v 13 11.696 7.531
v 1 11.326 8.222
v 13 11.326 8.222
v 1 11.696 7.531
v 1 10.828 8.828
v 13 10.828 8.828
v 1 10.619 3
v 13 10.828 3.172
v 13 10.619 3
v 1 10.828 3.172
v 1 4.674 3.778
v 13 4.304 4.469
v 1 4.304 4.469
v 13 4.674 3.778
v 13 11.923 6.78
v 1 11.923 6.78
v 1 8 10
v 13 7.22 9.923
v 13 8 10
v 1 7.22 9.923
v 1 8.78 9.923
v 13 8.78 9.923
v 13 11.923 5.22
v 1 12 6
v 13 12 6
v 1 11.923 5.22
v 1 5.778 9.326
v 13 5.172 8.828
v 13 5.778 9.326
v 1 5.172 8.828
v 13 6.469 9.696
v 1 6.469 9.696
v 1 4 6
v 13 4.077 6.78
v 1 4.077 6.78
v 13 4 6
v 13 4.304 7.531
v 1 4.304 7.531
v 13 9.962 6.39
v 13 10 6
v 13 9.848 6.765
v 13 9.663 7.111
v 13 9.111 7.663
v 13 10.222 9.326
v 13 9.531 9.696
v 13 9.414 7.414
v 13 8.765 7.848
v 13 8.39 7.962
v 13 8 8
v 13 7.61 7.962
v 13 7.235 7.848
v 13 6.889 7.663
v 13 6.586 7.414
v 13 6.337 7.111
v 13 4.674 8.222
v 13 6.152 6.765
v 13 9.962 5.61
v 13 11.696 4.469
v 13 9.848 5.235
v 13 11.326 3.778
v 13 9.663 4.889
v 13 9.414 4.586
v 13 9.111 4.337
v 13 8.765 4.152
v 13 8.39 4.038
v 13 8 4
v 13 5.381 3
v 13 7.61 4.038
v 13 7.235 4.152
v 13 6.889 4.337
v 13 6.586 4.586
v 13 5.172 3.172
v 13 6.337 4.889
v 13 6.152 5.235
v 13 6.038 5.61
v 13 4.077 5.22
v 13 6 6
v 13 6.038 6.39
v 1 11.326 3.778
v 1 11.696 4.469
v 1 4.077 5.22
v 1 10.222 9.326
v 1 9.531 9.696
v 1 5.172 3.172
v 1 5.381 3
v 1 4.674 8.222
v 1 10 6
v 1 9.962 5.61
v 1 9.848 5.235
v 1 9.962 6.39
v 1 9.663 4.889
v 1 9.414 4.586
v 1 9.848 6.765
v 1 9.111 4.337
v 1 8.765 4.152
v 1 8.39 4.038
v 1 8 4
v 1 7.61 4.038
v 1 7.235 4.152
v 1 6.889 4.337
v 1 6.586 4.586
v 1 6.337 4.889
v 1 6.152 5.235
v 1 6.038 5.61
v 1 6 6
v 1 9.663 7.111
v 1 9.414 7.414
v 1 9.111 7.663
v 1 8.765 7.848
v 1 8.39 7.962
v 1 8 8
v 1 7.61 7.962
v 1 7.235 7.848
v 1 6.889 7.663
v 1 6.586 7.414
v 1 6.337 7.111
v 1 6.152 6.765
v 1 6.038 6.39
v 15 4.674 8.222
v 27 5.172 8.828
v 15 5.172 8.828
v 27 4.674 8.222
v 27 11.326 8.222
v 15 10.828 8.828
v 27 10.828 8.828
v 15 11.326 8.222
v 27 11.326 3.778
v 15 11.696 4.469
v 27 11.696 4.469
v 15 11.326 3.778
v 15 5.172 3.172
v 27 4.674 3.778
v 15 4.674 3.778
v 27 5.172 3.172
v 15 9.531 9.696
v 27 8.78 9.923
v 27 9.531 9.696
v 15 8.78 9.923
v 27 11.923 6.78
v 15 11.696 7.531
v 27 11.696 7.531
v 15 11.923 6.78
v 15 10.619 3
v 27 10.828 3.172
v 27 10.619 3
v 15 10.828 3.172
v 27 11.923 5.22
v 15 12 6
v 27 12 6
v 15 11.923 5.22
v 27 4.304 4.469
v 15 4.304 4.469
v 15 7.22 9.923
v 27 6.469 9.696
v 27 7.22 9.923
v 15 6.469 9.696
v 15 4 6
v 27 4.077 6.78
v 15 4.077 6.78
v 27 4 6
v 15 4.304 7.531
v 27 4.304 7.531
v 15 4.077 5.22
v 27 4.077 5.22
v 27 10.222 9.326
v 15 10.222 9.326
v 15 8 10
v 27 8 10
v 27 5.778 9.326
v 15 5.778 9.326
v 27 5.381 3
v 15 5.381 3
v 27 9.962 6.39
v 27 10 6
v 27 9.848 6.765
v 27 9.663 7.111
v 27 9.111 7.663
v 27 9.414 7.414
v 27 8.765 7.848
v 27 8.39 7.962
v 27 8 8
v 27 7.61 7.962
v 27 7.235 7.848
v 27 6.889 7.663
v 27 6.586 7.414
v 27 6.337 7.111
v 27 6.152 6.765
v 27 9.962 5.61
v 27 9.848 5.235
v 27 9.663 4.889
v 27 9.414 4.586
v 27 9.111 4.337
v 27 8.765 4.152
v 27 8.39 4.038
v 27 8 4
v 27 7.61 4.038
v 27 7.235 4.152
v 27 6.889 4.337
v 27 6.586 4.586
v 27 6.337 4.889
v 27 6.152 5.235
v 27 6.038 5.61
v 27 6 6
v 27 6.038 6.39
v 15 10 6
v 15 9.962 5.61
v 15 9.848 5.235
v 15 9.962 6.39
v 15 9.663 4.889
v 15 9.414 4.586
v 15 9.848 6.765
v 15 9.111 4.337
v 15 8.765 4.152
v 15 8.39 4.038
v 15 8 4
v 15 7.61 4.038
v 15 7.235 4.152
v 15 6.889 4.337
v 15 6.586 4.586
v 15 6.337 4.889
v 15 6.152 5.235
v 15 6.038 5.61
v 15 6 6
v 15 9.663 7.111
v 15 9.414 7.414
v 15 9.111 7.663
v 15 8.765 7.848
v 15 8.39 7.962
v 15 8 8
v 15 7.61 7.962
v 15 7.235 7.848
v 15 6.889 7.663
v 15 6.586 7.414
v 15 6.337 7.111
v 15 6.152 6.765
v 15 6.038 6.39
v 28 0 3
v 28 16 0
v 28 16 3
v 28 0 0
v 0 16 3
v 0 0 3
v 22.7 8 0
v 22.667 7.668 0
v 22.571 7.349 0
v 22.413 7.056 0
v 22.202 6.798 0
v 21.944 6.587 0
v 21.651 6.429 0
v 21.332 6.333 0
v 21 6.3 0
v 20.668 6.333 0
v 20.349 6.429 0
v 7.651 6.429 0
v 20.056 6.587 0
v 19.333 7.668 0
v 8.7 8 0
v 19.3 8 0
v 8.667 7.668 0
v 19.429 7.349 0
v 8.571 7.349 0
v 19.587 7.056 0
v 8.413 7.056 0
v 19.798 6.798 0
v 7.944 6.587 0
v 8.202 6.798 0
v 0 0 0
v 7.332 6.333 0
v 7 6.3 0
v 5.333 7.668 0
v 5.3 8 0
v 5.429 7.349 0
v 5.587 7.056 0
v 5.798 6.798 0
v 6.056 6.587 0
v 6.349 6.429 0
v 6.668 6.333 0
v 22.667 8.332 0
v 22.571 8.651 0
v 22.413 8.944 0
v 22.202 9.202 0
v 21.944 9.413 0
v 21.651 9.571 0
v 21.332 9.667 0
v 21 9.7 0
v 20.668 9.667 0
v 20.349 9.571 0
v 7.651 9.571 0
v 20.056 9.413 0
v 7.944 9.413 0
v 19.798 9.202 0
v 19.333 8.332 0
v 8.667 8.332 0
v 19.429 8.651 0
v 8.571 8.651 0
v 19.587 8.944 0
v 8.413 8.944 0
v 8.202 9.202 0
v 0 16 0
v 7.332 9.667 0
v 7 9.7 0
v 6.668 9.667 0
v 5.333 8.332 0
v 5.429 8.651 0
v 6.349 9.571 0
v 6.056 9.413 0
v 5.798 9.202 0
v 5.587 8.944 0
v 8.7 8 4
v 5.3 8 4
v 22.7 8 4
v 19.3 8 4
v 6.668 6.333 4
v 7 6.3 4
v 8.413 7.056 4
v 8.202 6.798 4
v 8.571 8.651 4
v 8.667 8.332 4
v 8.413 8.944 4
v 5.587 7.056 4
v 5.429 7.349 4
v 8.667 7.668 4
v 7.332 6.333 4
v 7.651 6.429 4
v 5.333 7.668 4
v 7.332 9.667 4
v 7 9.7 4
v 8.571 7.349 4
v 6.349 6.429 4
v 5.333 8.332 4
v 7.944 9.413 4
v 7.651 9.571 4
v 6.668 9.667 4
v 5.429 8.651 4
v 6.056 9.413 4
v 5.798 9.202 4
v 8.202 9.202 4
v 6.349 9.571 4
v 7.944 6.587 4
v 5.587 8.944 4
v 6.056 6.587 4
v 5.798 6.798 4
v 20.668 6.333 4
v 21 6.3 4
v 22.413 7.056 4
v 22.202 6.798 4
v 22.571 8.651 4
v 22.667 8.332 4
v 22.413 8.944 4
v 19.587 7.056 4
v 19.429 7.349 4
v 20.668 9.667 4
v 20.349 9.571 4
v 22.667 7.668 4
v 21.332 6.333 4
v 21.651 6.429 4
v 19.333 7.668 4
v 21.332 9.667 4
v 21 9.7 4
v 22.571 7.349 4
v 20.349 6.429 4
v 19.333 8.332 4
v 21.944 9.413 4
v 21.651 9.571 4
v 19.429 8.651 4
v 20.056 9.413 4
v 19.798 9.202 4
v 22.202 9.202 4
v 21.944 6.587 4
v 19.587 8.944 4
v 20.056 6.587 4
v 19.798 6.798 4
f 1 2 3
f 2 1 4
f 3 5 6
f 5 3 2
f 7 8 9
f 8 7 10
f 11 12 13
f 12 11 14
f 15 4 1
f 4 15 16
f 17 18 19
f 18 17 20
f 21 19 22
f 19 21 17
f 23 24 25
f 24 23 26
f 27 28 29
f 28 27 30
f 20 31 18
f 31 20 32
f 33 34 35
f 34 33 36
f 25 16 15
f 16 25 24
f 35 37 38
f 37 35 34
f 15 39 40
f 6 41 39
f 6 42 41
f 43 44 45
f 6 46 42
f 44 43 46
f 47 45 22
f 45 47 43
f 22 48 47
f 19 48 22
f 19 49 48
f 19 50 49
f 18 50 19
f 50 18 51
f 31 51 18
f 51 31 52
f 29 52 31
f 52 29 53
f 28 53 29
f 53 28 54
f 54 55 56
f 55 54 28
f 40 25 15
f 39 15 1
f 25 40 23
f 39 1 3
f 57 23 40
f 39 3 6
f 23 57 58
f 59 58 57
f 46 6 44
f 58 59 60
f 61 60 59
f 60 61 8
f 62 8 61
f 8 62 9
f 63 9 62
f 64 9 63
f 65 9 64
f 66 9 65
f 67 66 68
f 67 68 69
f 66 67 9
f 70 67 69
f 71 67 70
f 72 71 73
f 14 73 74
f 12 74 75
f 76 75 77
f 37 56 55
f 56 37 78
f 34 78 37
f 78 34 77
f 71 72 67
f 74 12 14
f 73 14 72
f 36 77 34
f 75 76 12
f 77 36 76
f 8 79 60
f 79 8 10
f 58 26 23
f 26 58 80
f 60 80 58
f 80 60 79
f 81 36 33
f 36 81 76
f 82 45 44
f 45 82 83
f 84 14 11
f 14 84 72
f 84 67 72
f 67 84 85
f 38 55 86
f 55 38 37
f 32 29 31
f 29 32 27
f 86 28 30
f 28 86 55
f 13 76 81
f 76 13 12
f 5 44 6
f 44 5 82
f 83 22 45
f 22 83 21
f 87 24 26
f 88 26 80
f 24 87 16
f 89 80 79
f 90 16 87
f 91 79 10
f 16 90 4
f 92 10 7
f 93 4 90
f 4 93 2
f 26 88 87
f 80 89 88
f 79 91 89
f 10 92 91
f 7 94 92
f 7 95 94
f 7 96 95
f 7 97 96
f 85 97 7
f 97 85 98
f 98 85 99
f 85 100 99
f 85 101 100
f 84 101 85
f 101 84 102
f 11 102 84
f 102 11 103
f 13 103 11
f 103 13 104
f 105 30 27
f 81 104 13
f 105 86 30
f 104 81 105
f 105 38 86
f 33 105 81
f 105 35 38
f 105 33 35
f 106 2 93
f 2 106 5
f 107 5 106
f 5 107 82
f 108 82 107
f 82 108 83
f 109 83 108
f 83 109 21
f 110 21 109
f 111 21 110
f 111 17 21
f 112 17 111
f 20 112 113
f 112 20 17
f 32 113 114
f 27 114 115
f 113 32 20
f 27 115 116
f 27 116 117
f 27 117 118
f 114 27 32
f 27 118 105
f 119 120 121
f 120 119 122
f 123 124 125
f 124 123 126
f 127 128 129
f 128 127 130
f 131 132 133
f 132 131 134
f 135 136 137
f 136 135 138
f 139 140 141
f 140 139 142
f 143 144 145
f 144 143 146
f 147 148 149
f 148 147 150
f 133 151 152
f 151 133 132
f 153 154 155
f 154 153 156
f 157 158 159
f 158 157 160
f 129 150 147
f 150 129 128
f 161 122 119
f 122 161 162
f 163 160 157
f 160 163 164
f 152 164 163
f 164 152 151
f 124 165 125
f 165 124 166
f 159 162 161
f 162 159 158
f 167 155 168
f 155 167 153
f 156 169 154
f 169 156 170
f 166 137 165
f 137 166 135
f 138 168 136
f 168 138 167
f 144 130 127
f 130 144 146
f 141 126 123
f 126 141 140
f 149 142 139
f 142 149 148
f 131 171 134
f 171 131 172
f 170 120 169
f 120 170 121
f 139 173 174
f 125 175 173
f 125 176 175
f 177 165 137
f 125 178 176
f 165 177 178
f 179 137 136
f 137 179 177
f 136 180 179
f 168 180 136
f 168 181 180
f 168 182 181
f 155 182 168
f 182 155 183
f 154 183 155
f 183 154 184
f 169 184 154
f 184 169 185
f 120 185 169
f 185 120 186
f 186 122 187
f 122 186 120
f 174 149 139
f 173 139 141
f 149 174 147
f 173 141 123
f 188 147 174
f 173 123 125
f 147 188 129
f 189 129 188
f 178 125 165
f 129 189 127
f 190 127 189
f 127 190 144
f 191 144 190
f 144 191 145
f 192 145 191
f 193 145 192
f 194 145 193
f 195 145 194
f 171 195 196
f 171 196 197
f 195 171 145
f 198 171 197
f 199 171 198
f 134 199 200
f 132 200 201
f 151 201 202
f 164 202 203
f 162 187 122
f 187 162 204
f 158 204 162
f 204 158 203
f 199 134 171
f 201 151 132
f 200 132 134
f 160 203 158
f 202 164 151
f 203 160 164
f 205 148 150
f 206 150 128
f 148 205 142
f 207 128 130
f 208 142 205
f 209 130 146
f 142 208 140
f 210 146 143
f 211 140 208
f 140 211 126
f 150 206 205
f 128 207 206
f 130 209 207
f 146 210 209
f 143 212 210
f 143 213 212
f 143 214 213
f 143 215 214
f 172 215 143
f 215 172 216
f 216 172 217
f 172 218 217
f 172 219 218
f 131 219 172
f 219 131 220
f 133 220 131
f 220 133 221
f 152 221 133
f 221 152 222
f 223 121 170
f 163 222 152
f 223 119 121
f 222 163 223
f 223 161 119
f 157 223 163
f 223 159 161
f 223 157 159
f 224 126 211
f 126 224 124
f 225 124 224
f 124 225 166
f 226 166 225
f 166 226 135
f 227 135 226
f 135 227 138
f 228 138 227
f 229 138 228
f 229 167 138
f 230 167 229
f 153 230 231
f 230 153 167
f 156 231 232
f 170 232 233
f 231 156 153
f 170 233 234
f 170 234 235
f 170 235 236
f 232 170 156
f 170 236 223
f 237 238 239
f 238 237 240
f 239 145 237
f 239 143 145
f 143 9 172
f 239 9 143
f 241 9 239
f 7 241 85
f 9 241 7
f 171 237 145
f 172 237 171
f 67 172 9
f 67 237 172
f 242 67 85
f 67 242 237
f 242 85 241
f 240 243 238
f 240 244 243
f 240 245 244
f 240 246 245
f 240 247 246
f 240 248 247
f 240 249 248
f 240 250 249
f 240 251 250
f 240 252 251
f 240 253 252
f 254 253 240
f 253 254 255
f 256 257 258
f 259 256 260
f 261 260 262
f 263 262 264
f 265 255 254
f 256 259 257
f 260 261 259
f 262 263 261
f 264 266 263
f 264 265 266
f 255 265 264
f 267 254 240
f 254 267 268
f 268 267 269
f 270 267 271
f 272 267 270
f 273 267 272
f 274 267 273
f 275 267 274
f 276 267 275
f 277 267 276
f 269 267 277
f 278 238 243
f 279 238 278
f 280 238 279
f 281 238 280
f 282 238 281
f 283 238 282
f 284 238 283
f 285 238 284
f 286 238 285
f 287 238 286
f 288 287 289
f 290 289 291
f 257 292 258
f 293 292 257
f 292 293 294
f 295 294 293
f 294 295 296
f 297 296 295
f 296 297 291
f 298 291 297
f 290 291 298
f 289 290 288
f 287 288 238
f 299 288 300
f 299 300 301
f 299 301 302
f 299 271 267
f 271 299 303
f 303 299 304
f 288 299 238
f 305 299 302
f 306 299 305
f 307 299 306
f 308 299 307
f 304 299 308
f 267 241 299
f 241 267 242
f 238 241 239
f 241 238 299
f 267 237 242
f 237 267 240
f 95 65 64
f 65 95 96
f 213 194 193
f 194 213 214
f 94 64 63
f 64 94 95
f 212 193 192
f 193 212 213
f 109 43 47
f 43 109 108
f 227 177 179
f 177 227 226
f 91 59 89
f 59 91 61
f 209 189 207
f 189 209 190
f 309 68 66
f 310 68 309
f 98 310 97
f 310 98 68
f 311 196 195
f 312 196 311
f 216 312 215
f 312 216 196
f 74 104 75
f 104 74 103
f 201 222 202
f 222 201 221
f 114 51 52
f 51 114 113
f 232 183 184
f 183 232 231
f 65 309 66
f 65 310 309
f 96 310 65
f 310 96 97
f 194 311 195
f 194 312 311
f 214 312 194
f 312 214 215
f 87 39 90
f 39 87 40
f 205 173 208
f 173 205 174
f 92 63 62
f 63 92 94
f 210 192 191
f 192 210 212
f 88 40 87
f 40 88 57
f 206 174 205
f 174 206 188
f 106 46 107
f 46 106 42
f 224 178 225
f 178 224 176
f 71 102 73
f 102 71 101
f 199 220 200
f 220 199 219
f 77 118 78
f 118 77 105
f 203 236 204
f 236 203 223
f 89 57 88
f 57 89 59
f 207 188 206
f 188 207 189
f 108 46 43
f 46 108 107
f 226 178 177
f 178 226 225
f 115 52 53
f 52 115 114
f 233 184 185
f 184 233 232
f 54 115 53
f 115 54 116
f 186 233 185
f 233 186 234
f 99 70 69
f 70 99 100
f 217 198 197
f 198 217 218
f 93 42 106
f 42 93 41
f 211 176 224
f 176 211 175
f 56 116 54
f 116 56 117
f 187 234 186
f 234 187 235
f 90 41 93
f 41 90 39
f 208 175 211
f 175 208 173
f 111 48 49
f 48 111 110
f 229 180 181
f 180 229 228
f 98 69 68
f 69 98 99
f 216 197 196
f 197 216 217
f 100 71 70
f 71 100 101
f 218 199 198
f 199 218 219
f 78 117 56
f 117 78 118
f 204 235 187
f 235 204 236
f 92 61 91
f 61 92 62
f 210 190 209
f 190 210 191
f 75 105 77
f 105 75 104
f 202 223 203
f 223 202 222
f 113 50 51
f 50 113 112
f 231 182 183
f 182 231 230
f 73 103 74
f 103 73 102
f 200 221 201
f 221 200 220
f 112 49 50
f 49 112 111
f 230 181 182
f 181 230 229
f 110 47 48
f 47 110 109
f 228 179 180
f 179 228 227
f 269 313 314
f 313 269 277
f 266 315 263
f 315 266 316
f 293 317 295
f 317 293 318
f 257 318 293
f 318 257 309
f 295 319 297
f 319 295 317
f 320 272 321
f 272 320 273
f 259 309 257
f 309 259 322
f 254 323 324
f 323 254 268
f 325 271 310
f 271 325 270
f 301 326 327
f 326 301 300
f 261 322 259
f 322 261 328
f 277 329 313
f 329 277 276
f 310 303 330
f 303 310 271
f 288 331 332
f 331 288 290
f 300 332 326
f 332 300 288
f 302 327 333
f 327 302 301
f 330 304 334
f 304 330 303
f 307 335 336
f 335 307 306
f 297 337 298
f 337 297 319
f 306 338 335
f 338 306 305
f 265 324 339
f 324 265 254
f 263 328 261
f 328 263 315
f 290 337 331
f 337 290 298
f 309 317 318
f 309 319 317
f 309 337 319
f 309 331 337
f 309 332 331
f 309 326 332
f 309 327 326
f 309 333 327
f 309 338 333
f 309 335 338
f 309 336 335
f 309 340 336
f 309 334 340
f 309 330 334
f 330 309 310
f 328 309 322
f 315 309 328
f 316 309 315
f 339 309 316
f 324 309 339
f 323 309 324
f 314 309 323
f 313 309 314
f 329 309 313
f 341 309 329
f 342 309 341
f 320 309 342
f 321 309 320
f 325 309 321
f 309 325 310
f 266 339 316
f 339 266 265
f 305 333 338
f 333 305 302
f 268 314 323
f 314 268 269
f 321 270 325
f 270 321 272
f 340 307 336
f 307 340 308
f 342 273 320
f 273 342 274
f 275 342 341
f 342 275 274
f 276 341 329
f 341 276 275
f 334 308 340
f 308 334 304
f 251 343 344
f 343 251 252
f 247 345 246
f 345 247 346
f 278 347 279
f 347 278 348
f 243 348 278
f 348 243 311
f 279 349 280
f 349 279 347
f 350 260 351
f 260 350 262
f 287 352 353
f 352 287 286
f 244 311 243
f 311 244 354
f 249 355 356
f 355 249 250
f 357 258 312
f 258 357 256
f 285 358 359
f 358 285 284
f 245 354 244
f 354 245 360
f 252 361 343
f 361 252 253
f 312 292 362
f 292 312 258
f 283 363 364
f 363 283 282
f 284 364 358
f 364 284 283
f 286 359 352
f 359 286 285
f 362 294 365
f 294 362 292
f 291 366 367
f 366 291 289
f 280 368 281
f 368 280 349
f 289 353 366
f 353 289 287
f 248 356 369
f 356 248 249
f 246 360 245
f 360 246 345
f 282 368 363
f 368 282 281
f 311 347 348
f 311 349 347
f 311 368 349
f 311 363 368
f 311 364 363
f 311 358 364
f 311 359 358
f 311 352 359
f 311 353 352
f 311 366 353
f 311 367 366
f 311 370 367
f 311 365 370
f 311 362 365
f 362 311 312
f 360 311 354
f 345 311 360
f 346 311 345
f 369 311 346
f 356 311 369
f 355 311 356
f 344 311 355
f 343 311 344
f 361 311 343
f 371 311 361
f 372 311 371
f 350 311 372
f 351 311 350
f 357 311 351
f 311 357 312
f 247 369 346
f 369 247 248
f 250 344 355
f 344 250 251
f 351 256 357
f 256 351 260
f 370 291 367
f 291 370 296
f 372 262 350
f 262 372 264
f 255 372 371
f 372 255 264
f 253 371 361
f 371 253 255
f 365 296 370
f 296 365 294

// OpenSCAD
$fn = 32;

// ----------------------------------------------------------------------
// Cable clip: cable 4 mm, clamp 8 mm, base 28 mm
// ----------------------------------------------------------------------

// --- parameters (mm) ---
base_w = 28;              // base length, X
base_d = 16;              // base width, Y
base_t = 3;               // base thickness
clamp_d = 8;              // clamp outside diameter
wall_t = 2;               // clamp wall
cable_d = 4;              // cable opening
ring_w = 12;              // clamp width along the cable
screw_d = 3.4;            // screw clearance
sink = 1;                 // overlap of the clamp into the base
pitch = 14;               // distance between the two clamps

module base() {
  cube([base_w, base_d, base_t]);
}

module clamps() {
  for (sx = [-1, 1])
    translate([base_w / 2 + sx * pitch / 2, base_d / 2, base_t + clamp_d / 2 - sink]) rotate([0, 90, 0])
      cylinder(h = ring_w, d = clamp_d, center = true);
}

difference() {
  union() {
    base();
    clamps();
  }
  for (sx = [-1, 1])
    translate([base_w / 2 + sx * pitch / 2, base_d / 2, base_t + clamp_d / 2 - sink]) rotate([0, 90, 0]) translate([0, 0, -ring_w / 2 - 1]) cylinder(h = ring_w + 2, d = cable_d);
  translate([7, base_d / 2, -1]) cylinder(h = base_t + 2, d = screw_d);
  translate([21, base_d / 2, -1]) cylinder(h = base_t + 2, d = screw_d);
}
